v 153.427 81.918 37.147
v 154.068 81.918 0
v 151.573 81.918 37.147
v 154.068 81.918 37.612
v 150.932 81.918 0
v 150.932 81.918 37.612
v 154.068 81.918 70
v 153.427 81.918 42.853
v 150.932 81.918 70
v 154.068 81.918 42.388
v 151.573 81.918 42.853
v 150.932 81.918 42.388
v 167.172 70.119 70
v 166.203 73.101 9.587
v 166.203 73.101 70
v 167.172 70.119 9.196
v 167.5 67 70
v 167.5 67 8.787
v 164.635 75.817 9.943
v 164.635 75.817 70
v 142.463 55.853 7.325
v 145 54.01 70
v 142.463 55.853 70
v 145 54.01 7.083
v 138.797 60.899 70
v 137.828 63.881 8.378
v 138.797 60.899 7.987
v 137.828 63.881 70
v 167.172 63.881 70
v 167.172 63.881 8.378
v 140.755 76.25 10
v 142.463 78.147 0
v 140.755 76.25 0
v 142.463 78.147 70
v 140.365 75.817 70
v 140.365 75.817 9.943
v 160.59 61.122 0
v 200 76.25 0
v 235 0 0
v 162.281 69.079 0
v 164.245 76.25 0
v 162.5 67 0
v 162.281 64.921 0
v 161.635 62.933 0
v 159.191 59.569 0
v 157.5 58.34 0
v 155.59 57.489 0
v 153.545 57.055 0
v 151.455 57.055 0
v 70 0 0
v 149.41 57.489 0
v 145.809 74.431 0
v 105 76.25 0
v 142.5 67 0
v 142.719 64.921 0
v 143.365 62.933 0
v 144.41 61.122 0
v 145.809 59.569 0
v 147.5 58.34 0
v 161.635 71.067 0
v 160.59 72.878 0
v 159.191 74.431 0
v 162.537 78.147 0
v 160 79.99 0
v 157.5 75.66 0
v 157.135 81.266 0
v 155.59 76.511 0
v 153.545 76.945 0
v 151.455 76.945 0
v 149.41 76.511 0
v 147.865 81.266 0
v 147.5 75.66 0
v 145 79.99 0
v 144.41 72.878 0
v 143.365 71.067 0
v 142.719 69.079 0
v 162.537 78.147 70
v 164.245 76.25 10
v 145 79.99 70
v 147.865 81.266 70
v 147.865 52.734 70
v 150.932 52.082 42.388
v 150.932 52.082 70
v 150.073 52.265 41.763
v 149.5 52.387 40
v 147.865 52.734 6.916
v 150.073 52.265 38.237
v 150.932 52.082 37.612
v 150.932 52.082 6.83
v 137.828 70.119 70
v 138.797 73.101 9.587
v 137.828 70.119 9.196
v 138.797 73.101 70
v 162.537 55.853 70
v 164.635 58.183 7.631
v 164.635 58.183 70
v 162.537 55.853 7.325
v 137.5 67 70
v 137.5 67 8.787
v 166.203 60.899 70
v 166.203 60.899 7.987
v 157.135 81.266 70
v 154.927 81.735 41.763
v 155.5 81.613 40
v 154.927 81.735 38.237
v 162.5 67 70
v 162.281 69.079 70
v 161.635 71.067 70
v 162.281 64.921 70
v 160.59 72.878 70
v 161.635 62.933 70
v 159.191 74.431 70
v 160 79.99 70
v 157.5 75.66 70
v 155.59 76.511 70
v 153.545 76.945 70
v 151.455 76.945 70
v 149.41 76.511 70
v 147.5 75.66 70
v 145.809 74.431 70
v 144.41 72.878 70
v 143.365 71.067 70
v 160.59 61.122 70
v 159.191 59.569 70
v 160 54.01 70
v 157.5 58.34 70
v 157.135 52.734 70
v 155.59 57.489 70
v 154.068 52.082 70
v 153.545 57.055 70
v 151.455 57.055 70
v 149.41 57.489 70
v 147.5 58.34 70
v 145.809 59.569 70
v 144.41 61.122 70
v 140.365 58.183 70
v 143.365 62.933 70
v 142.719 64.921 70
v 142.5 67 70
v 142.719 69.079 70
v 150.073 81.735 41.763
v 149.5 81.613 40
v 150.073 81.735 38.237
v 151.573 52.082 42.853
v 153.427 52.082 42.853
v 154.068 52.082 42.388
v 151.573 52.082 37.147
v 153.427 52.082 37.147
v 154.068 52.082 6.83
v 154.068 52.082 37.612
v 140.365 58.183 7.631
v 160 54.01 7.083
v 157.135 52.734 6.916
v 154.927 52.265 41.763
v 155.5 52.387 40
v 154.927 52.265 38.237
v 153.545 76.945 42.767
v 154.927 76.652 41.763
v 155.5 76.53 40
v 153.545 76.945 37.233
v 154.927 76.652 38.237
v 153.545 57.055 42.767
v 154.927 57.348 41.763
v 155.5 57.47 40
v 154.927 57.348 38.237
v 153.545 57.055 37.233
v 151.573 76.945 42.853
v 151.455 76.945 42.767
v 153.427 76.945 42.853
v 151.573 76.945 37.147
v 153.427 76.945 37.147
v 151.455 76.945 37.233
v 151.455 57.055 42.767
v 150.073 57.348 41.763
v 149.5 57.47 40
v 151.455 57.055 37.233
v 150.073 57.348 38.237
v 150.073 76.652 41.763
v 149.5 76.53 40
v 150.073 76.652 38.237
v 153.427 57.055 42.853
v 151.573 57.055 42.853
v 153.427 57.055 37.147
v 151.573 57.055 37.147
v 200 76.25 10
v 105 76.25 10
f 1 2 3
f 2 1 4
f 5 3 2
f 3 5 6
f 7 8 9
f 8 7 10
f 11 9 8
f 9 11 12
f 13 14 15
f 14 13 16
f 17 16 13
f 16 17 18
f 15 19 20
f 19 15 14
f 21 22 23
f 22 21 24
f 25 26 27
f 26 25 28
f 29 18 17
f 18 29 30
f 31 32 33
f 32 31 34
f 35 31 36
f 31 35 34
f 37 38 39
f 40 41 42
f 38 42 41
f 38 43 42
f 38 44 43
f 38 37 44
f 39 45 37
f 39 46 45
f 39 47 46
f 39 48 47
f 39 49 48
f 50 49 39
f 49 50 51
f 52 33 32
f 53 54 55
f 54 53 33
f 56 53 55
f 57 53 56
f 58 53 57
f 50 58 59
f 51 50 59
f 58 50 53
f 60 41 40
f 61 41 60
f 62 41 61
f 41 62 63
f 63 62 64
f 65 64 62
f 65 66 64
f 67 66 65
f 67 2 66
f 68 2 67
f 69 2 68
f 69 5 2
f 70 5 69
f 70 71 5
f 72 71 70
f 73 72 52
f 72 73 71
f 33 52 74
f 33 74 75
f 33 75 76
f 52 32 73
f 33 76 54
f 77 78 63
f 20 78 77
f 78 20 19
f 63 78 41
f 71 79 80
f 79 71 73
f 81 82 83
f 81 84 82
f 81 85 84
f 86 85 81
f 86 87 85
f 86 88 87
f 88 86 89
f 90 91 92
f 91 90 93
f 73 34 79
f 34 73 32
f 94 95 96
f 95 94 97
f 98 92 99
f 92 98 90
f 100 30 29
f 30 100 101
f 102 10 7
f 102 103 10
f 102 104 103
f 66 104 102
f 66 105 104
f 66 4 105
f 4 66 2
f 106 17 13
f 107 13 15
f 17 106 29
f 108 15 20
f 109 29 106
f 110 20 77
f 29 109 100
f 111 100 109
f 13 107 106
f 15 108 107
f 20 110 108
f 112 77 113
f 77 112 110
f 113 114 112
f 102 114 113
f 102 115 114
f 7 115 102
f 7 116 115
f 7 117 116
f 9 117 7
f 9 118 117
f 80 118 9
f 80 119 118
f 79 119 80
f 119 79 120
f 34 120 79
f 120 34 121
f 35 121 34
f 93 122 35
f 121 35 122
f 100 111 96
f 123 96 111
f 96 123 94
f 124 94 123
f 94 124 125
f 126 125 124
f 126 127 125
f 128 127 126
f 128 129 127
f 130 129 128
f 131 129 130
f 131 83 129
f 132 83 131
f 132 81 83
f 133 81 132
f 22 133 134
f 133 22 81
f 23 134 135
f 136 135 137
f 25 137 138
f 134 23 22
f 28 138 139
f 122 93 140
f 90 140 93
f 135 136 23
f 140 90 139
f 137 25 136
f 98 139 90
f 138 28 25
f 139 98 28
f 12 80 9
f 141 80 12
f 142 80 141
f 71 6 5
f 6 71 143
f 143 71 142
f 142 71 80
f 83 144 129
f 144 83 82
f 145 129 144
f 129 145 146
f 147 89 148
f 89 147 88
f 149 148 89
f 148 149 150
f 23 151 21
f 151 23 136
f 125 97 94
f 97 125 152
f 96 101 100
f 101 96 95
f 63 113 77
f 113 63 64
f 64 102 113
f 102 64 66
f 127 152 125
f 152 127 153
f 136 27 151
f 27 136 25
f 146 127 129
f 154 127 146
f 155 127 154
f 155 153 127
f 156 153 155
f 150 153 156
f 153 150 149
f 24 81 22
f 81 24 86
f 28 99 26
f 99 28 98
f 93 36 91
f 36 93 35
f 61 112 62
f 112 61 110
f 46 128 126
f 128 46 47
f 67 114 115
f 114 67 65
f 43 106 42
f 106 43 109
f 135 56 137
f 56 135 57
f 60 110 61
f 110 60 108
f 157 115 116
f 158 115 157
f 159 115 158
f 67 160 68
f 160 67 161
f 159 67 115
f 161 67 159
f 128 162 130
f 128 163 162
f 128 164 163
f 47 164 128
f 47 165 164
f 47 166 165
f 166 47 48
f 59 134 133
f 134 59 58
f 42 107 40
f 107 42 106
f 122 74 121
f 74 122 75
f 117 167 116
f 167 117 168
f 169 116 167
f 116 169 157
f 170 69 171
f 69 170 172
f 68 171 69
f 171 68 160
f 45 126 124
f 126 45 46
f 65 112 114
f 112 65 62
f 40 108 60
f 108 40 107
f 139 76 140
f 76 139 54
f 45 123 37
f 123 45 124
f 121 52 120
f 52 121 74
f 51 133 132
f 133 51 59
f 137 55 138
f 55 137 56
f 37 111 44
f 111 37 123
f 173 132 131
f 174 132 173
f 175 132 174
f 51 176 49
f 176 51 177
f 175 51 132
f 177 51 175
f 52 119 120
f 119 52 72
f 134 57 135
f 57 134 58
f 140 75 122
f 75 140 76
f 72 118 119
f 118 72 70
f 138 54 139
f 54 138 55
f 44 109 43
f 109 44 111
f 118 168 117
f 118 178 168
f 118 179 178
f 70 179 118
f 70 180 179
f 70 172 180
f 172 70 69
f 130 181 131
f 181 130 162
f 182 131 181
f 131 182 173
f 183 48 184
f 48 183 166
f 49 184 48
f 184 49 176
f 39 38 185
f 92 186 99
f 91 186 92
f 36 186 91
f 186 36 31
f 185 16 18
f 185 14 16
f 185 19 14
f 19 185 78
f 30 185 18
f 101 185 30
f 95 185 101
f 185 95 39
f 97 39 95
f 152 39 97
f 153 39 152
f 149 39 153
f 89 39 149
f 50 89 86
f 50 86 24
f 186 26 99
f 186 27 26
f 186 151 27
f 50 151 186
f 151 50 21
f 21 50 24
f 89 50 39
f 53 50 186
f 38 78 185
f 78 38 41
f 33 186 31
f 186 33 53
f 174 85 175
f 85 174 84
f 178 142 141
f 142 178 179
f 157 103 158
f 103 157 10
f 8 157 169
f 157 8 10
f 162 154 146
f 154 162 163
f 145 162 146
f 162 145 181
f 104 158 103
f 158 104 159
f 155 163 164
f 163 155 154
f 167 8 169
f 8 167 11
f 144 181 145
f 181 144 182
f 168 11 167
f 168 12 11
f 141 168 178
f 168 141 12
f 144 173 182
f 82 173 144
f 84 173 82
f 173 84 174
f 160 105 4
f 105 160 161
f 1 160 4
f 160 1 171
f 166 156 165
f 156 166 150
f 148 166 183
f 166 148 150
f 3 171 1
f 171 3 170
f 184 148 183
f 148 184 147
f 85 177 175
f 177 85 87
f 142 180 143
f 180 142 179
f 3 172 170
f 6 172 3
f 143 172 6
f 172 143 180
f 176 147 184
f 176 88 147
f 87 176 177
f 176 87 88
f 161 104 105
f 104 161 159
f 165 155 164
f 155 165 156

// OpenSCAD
// Edit this to change the handle radius
handle = 10;

difference(){
	difference(){
		union(){
			// Physical hoe
			polyhedron(
				points=[ [70,0,0],[235,0,0],[200,76.25,0],[105,76.25,0],[200,76.25,10],[105,76.25,10] ],
				faces=[ [0,1,2,3],[0,5,4,1],[0,3,5],[1,4,2],[3,2,4,5] ]
			);

			// Handle holder
			difference(){
				translate( [152.5,67,0] ){
					cylinder(h=70, r1=handle+5, r2=handle+5);
				}

				translate( [152.5,67,-1] ){
				cylinder(h=73, r1=handle, r2=handle);
				}
			}
		}
		translate( [152.5,67,-1] ){
			cylinder(h=71, r1=handle, r2=handle);
		}
	}

	rotate(a=[90,0,0]){
		translate( [152.5,40,-110] ){
			cylinder(h=80, r1=3, r2=3);
		}
	}
}
